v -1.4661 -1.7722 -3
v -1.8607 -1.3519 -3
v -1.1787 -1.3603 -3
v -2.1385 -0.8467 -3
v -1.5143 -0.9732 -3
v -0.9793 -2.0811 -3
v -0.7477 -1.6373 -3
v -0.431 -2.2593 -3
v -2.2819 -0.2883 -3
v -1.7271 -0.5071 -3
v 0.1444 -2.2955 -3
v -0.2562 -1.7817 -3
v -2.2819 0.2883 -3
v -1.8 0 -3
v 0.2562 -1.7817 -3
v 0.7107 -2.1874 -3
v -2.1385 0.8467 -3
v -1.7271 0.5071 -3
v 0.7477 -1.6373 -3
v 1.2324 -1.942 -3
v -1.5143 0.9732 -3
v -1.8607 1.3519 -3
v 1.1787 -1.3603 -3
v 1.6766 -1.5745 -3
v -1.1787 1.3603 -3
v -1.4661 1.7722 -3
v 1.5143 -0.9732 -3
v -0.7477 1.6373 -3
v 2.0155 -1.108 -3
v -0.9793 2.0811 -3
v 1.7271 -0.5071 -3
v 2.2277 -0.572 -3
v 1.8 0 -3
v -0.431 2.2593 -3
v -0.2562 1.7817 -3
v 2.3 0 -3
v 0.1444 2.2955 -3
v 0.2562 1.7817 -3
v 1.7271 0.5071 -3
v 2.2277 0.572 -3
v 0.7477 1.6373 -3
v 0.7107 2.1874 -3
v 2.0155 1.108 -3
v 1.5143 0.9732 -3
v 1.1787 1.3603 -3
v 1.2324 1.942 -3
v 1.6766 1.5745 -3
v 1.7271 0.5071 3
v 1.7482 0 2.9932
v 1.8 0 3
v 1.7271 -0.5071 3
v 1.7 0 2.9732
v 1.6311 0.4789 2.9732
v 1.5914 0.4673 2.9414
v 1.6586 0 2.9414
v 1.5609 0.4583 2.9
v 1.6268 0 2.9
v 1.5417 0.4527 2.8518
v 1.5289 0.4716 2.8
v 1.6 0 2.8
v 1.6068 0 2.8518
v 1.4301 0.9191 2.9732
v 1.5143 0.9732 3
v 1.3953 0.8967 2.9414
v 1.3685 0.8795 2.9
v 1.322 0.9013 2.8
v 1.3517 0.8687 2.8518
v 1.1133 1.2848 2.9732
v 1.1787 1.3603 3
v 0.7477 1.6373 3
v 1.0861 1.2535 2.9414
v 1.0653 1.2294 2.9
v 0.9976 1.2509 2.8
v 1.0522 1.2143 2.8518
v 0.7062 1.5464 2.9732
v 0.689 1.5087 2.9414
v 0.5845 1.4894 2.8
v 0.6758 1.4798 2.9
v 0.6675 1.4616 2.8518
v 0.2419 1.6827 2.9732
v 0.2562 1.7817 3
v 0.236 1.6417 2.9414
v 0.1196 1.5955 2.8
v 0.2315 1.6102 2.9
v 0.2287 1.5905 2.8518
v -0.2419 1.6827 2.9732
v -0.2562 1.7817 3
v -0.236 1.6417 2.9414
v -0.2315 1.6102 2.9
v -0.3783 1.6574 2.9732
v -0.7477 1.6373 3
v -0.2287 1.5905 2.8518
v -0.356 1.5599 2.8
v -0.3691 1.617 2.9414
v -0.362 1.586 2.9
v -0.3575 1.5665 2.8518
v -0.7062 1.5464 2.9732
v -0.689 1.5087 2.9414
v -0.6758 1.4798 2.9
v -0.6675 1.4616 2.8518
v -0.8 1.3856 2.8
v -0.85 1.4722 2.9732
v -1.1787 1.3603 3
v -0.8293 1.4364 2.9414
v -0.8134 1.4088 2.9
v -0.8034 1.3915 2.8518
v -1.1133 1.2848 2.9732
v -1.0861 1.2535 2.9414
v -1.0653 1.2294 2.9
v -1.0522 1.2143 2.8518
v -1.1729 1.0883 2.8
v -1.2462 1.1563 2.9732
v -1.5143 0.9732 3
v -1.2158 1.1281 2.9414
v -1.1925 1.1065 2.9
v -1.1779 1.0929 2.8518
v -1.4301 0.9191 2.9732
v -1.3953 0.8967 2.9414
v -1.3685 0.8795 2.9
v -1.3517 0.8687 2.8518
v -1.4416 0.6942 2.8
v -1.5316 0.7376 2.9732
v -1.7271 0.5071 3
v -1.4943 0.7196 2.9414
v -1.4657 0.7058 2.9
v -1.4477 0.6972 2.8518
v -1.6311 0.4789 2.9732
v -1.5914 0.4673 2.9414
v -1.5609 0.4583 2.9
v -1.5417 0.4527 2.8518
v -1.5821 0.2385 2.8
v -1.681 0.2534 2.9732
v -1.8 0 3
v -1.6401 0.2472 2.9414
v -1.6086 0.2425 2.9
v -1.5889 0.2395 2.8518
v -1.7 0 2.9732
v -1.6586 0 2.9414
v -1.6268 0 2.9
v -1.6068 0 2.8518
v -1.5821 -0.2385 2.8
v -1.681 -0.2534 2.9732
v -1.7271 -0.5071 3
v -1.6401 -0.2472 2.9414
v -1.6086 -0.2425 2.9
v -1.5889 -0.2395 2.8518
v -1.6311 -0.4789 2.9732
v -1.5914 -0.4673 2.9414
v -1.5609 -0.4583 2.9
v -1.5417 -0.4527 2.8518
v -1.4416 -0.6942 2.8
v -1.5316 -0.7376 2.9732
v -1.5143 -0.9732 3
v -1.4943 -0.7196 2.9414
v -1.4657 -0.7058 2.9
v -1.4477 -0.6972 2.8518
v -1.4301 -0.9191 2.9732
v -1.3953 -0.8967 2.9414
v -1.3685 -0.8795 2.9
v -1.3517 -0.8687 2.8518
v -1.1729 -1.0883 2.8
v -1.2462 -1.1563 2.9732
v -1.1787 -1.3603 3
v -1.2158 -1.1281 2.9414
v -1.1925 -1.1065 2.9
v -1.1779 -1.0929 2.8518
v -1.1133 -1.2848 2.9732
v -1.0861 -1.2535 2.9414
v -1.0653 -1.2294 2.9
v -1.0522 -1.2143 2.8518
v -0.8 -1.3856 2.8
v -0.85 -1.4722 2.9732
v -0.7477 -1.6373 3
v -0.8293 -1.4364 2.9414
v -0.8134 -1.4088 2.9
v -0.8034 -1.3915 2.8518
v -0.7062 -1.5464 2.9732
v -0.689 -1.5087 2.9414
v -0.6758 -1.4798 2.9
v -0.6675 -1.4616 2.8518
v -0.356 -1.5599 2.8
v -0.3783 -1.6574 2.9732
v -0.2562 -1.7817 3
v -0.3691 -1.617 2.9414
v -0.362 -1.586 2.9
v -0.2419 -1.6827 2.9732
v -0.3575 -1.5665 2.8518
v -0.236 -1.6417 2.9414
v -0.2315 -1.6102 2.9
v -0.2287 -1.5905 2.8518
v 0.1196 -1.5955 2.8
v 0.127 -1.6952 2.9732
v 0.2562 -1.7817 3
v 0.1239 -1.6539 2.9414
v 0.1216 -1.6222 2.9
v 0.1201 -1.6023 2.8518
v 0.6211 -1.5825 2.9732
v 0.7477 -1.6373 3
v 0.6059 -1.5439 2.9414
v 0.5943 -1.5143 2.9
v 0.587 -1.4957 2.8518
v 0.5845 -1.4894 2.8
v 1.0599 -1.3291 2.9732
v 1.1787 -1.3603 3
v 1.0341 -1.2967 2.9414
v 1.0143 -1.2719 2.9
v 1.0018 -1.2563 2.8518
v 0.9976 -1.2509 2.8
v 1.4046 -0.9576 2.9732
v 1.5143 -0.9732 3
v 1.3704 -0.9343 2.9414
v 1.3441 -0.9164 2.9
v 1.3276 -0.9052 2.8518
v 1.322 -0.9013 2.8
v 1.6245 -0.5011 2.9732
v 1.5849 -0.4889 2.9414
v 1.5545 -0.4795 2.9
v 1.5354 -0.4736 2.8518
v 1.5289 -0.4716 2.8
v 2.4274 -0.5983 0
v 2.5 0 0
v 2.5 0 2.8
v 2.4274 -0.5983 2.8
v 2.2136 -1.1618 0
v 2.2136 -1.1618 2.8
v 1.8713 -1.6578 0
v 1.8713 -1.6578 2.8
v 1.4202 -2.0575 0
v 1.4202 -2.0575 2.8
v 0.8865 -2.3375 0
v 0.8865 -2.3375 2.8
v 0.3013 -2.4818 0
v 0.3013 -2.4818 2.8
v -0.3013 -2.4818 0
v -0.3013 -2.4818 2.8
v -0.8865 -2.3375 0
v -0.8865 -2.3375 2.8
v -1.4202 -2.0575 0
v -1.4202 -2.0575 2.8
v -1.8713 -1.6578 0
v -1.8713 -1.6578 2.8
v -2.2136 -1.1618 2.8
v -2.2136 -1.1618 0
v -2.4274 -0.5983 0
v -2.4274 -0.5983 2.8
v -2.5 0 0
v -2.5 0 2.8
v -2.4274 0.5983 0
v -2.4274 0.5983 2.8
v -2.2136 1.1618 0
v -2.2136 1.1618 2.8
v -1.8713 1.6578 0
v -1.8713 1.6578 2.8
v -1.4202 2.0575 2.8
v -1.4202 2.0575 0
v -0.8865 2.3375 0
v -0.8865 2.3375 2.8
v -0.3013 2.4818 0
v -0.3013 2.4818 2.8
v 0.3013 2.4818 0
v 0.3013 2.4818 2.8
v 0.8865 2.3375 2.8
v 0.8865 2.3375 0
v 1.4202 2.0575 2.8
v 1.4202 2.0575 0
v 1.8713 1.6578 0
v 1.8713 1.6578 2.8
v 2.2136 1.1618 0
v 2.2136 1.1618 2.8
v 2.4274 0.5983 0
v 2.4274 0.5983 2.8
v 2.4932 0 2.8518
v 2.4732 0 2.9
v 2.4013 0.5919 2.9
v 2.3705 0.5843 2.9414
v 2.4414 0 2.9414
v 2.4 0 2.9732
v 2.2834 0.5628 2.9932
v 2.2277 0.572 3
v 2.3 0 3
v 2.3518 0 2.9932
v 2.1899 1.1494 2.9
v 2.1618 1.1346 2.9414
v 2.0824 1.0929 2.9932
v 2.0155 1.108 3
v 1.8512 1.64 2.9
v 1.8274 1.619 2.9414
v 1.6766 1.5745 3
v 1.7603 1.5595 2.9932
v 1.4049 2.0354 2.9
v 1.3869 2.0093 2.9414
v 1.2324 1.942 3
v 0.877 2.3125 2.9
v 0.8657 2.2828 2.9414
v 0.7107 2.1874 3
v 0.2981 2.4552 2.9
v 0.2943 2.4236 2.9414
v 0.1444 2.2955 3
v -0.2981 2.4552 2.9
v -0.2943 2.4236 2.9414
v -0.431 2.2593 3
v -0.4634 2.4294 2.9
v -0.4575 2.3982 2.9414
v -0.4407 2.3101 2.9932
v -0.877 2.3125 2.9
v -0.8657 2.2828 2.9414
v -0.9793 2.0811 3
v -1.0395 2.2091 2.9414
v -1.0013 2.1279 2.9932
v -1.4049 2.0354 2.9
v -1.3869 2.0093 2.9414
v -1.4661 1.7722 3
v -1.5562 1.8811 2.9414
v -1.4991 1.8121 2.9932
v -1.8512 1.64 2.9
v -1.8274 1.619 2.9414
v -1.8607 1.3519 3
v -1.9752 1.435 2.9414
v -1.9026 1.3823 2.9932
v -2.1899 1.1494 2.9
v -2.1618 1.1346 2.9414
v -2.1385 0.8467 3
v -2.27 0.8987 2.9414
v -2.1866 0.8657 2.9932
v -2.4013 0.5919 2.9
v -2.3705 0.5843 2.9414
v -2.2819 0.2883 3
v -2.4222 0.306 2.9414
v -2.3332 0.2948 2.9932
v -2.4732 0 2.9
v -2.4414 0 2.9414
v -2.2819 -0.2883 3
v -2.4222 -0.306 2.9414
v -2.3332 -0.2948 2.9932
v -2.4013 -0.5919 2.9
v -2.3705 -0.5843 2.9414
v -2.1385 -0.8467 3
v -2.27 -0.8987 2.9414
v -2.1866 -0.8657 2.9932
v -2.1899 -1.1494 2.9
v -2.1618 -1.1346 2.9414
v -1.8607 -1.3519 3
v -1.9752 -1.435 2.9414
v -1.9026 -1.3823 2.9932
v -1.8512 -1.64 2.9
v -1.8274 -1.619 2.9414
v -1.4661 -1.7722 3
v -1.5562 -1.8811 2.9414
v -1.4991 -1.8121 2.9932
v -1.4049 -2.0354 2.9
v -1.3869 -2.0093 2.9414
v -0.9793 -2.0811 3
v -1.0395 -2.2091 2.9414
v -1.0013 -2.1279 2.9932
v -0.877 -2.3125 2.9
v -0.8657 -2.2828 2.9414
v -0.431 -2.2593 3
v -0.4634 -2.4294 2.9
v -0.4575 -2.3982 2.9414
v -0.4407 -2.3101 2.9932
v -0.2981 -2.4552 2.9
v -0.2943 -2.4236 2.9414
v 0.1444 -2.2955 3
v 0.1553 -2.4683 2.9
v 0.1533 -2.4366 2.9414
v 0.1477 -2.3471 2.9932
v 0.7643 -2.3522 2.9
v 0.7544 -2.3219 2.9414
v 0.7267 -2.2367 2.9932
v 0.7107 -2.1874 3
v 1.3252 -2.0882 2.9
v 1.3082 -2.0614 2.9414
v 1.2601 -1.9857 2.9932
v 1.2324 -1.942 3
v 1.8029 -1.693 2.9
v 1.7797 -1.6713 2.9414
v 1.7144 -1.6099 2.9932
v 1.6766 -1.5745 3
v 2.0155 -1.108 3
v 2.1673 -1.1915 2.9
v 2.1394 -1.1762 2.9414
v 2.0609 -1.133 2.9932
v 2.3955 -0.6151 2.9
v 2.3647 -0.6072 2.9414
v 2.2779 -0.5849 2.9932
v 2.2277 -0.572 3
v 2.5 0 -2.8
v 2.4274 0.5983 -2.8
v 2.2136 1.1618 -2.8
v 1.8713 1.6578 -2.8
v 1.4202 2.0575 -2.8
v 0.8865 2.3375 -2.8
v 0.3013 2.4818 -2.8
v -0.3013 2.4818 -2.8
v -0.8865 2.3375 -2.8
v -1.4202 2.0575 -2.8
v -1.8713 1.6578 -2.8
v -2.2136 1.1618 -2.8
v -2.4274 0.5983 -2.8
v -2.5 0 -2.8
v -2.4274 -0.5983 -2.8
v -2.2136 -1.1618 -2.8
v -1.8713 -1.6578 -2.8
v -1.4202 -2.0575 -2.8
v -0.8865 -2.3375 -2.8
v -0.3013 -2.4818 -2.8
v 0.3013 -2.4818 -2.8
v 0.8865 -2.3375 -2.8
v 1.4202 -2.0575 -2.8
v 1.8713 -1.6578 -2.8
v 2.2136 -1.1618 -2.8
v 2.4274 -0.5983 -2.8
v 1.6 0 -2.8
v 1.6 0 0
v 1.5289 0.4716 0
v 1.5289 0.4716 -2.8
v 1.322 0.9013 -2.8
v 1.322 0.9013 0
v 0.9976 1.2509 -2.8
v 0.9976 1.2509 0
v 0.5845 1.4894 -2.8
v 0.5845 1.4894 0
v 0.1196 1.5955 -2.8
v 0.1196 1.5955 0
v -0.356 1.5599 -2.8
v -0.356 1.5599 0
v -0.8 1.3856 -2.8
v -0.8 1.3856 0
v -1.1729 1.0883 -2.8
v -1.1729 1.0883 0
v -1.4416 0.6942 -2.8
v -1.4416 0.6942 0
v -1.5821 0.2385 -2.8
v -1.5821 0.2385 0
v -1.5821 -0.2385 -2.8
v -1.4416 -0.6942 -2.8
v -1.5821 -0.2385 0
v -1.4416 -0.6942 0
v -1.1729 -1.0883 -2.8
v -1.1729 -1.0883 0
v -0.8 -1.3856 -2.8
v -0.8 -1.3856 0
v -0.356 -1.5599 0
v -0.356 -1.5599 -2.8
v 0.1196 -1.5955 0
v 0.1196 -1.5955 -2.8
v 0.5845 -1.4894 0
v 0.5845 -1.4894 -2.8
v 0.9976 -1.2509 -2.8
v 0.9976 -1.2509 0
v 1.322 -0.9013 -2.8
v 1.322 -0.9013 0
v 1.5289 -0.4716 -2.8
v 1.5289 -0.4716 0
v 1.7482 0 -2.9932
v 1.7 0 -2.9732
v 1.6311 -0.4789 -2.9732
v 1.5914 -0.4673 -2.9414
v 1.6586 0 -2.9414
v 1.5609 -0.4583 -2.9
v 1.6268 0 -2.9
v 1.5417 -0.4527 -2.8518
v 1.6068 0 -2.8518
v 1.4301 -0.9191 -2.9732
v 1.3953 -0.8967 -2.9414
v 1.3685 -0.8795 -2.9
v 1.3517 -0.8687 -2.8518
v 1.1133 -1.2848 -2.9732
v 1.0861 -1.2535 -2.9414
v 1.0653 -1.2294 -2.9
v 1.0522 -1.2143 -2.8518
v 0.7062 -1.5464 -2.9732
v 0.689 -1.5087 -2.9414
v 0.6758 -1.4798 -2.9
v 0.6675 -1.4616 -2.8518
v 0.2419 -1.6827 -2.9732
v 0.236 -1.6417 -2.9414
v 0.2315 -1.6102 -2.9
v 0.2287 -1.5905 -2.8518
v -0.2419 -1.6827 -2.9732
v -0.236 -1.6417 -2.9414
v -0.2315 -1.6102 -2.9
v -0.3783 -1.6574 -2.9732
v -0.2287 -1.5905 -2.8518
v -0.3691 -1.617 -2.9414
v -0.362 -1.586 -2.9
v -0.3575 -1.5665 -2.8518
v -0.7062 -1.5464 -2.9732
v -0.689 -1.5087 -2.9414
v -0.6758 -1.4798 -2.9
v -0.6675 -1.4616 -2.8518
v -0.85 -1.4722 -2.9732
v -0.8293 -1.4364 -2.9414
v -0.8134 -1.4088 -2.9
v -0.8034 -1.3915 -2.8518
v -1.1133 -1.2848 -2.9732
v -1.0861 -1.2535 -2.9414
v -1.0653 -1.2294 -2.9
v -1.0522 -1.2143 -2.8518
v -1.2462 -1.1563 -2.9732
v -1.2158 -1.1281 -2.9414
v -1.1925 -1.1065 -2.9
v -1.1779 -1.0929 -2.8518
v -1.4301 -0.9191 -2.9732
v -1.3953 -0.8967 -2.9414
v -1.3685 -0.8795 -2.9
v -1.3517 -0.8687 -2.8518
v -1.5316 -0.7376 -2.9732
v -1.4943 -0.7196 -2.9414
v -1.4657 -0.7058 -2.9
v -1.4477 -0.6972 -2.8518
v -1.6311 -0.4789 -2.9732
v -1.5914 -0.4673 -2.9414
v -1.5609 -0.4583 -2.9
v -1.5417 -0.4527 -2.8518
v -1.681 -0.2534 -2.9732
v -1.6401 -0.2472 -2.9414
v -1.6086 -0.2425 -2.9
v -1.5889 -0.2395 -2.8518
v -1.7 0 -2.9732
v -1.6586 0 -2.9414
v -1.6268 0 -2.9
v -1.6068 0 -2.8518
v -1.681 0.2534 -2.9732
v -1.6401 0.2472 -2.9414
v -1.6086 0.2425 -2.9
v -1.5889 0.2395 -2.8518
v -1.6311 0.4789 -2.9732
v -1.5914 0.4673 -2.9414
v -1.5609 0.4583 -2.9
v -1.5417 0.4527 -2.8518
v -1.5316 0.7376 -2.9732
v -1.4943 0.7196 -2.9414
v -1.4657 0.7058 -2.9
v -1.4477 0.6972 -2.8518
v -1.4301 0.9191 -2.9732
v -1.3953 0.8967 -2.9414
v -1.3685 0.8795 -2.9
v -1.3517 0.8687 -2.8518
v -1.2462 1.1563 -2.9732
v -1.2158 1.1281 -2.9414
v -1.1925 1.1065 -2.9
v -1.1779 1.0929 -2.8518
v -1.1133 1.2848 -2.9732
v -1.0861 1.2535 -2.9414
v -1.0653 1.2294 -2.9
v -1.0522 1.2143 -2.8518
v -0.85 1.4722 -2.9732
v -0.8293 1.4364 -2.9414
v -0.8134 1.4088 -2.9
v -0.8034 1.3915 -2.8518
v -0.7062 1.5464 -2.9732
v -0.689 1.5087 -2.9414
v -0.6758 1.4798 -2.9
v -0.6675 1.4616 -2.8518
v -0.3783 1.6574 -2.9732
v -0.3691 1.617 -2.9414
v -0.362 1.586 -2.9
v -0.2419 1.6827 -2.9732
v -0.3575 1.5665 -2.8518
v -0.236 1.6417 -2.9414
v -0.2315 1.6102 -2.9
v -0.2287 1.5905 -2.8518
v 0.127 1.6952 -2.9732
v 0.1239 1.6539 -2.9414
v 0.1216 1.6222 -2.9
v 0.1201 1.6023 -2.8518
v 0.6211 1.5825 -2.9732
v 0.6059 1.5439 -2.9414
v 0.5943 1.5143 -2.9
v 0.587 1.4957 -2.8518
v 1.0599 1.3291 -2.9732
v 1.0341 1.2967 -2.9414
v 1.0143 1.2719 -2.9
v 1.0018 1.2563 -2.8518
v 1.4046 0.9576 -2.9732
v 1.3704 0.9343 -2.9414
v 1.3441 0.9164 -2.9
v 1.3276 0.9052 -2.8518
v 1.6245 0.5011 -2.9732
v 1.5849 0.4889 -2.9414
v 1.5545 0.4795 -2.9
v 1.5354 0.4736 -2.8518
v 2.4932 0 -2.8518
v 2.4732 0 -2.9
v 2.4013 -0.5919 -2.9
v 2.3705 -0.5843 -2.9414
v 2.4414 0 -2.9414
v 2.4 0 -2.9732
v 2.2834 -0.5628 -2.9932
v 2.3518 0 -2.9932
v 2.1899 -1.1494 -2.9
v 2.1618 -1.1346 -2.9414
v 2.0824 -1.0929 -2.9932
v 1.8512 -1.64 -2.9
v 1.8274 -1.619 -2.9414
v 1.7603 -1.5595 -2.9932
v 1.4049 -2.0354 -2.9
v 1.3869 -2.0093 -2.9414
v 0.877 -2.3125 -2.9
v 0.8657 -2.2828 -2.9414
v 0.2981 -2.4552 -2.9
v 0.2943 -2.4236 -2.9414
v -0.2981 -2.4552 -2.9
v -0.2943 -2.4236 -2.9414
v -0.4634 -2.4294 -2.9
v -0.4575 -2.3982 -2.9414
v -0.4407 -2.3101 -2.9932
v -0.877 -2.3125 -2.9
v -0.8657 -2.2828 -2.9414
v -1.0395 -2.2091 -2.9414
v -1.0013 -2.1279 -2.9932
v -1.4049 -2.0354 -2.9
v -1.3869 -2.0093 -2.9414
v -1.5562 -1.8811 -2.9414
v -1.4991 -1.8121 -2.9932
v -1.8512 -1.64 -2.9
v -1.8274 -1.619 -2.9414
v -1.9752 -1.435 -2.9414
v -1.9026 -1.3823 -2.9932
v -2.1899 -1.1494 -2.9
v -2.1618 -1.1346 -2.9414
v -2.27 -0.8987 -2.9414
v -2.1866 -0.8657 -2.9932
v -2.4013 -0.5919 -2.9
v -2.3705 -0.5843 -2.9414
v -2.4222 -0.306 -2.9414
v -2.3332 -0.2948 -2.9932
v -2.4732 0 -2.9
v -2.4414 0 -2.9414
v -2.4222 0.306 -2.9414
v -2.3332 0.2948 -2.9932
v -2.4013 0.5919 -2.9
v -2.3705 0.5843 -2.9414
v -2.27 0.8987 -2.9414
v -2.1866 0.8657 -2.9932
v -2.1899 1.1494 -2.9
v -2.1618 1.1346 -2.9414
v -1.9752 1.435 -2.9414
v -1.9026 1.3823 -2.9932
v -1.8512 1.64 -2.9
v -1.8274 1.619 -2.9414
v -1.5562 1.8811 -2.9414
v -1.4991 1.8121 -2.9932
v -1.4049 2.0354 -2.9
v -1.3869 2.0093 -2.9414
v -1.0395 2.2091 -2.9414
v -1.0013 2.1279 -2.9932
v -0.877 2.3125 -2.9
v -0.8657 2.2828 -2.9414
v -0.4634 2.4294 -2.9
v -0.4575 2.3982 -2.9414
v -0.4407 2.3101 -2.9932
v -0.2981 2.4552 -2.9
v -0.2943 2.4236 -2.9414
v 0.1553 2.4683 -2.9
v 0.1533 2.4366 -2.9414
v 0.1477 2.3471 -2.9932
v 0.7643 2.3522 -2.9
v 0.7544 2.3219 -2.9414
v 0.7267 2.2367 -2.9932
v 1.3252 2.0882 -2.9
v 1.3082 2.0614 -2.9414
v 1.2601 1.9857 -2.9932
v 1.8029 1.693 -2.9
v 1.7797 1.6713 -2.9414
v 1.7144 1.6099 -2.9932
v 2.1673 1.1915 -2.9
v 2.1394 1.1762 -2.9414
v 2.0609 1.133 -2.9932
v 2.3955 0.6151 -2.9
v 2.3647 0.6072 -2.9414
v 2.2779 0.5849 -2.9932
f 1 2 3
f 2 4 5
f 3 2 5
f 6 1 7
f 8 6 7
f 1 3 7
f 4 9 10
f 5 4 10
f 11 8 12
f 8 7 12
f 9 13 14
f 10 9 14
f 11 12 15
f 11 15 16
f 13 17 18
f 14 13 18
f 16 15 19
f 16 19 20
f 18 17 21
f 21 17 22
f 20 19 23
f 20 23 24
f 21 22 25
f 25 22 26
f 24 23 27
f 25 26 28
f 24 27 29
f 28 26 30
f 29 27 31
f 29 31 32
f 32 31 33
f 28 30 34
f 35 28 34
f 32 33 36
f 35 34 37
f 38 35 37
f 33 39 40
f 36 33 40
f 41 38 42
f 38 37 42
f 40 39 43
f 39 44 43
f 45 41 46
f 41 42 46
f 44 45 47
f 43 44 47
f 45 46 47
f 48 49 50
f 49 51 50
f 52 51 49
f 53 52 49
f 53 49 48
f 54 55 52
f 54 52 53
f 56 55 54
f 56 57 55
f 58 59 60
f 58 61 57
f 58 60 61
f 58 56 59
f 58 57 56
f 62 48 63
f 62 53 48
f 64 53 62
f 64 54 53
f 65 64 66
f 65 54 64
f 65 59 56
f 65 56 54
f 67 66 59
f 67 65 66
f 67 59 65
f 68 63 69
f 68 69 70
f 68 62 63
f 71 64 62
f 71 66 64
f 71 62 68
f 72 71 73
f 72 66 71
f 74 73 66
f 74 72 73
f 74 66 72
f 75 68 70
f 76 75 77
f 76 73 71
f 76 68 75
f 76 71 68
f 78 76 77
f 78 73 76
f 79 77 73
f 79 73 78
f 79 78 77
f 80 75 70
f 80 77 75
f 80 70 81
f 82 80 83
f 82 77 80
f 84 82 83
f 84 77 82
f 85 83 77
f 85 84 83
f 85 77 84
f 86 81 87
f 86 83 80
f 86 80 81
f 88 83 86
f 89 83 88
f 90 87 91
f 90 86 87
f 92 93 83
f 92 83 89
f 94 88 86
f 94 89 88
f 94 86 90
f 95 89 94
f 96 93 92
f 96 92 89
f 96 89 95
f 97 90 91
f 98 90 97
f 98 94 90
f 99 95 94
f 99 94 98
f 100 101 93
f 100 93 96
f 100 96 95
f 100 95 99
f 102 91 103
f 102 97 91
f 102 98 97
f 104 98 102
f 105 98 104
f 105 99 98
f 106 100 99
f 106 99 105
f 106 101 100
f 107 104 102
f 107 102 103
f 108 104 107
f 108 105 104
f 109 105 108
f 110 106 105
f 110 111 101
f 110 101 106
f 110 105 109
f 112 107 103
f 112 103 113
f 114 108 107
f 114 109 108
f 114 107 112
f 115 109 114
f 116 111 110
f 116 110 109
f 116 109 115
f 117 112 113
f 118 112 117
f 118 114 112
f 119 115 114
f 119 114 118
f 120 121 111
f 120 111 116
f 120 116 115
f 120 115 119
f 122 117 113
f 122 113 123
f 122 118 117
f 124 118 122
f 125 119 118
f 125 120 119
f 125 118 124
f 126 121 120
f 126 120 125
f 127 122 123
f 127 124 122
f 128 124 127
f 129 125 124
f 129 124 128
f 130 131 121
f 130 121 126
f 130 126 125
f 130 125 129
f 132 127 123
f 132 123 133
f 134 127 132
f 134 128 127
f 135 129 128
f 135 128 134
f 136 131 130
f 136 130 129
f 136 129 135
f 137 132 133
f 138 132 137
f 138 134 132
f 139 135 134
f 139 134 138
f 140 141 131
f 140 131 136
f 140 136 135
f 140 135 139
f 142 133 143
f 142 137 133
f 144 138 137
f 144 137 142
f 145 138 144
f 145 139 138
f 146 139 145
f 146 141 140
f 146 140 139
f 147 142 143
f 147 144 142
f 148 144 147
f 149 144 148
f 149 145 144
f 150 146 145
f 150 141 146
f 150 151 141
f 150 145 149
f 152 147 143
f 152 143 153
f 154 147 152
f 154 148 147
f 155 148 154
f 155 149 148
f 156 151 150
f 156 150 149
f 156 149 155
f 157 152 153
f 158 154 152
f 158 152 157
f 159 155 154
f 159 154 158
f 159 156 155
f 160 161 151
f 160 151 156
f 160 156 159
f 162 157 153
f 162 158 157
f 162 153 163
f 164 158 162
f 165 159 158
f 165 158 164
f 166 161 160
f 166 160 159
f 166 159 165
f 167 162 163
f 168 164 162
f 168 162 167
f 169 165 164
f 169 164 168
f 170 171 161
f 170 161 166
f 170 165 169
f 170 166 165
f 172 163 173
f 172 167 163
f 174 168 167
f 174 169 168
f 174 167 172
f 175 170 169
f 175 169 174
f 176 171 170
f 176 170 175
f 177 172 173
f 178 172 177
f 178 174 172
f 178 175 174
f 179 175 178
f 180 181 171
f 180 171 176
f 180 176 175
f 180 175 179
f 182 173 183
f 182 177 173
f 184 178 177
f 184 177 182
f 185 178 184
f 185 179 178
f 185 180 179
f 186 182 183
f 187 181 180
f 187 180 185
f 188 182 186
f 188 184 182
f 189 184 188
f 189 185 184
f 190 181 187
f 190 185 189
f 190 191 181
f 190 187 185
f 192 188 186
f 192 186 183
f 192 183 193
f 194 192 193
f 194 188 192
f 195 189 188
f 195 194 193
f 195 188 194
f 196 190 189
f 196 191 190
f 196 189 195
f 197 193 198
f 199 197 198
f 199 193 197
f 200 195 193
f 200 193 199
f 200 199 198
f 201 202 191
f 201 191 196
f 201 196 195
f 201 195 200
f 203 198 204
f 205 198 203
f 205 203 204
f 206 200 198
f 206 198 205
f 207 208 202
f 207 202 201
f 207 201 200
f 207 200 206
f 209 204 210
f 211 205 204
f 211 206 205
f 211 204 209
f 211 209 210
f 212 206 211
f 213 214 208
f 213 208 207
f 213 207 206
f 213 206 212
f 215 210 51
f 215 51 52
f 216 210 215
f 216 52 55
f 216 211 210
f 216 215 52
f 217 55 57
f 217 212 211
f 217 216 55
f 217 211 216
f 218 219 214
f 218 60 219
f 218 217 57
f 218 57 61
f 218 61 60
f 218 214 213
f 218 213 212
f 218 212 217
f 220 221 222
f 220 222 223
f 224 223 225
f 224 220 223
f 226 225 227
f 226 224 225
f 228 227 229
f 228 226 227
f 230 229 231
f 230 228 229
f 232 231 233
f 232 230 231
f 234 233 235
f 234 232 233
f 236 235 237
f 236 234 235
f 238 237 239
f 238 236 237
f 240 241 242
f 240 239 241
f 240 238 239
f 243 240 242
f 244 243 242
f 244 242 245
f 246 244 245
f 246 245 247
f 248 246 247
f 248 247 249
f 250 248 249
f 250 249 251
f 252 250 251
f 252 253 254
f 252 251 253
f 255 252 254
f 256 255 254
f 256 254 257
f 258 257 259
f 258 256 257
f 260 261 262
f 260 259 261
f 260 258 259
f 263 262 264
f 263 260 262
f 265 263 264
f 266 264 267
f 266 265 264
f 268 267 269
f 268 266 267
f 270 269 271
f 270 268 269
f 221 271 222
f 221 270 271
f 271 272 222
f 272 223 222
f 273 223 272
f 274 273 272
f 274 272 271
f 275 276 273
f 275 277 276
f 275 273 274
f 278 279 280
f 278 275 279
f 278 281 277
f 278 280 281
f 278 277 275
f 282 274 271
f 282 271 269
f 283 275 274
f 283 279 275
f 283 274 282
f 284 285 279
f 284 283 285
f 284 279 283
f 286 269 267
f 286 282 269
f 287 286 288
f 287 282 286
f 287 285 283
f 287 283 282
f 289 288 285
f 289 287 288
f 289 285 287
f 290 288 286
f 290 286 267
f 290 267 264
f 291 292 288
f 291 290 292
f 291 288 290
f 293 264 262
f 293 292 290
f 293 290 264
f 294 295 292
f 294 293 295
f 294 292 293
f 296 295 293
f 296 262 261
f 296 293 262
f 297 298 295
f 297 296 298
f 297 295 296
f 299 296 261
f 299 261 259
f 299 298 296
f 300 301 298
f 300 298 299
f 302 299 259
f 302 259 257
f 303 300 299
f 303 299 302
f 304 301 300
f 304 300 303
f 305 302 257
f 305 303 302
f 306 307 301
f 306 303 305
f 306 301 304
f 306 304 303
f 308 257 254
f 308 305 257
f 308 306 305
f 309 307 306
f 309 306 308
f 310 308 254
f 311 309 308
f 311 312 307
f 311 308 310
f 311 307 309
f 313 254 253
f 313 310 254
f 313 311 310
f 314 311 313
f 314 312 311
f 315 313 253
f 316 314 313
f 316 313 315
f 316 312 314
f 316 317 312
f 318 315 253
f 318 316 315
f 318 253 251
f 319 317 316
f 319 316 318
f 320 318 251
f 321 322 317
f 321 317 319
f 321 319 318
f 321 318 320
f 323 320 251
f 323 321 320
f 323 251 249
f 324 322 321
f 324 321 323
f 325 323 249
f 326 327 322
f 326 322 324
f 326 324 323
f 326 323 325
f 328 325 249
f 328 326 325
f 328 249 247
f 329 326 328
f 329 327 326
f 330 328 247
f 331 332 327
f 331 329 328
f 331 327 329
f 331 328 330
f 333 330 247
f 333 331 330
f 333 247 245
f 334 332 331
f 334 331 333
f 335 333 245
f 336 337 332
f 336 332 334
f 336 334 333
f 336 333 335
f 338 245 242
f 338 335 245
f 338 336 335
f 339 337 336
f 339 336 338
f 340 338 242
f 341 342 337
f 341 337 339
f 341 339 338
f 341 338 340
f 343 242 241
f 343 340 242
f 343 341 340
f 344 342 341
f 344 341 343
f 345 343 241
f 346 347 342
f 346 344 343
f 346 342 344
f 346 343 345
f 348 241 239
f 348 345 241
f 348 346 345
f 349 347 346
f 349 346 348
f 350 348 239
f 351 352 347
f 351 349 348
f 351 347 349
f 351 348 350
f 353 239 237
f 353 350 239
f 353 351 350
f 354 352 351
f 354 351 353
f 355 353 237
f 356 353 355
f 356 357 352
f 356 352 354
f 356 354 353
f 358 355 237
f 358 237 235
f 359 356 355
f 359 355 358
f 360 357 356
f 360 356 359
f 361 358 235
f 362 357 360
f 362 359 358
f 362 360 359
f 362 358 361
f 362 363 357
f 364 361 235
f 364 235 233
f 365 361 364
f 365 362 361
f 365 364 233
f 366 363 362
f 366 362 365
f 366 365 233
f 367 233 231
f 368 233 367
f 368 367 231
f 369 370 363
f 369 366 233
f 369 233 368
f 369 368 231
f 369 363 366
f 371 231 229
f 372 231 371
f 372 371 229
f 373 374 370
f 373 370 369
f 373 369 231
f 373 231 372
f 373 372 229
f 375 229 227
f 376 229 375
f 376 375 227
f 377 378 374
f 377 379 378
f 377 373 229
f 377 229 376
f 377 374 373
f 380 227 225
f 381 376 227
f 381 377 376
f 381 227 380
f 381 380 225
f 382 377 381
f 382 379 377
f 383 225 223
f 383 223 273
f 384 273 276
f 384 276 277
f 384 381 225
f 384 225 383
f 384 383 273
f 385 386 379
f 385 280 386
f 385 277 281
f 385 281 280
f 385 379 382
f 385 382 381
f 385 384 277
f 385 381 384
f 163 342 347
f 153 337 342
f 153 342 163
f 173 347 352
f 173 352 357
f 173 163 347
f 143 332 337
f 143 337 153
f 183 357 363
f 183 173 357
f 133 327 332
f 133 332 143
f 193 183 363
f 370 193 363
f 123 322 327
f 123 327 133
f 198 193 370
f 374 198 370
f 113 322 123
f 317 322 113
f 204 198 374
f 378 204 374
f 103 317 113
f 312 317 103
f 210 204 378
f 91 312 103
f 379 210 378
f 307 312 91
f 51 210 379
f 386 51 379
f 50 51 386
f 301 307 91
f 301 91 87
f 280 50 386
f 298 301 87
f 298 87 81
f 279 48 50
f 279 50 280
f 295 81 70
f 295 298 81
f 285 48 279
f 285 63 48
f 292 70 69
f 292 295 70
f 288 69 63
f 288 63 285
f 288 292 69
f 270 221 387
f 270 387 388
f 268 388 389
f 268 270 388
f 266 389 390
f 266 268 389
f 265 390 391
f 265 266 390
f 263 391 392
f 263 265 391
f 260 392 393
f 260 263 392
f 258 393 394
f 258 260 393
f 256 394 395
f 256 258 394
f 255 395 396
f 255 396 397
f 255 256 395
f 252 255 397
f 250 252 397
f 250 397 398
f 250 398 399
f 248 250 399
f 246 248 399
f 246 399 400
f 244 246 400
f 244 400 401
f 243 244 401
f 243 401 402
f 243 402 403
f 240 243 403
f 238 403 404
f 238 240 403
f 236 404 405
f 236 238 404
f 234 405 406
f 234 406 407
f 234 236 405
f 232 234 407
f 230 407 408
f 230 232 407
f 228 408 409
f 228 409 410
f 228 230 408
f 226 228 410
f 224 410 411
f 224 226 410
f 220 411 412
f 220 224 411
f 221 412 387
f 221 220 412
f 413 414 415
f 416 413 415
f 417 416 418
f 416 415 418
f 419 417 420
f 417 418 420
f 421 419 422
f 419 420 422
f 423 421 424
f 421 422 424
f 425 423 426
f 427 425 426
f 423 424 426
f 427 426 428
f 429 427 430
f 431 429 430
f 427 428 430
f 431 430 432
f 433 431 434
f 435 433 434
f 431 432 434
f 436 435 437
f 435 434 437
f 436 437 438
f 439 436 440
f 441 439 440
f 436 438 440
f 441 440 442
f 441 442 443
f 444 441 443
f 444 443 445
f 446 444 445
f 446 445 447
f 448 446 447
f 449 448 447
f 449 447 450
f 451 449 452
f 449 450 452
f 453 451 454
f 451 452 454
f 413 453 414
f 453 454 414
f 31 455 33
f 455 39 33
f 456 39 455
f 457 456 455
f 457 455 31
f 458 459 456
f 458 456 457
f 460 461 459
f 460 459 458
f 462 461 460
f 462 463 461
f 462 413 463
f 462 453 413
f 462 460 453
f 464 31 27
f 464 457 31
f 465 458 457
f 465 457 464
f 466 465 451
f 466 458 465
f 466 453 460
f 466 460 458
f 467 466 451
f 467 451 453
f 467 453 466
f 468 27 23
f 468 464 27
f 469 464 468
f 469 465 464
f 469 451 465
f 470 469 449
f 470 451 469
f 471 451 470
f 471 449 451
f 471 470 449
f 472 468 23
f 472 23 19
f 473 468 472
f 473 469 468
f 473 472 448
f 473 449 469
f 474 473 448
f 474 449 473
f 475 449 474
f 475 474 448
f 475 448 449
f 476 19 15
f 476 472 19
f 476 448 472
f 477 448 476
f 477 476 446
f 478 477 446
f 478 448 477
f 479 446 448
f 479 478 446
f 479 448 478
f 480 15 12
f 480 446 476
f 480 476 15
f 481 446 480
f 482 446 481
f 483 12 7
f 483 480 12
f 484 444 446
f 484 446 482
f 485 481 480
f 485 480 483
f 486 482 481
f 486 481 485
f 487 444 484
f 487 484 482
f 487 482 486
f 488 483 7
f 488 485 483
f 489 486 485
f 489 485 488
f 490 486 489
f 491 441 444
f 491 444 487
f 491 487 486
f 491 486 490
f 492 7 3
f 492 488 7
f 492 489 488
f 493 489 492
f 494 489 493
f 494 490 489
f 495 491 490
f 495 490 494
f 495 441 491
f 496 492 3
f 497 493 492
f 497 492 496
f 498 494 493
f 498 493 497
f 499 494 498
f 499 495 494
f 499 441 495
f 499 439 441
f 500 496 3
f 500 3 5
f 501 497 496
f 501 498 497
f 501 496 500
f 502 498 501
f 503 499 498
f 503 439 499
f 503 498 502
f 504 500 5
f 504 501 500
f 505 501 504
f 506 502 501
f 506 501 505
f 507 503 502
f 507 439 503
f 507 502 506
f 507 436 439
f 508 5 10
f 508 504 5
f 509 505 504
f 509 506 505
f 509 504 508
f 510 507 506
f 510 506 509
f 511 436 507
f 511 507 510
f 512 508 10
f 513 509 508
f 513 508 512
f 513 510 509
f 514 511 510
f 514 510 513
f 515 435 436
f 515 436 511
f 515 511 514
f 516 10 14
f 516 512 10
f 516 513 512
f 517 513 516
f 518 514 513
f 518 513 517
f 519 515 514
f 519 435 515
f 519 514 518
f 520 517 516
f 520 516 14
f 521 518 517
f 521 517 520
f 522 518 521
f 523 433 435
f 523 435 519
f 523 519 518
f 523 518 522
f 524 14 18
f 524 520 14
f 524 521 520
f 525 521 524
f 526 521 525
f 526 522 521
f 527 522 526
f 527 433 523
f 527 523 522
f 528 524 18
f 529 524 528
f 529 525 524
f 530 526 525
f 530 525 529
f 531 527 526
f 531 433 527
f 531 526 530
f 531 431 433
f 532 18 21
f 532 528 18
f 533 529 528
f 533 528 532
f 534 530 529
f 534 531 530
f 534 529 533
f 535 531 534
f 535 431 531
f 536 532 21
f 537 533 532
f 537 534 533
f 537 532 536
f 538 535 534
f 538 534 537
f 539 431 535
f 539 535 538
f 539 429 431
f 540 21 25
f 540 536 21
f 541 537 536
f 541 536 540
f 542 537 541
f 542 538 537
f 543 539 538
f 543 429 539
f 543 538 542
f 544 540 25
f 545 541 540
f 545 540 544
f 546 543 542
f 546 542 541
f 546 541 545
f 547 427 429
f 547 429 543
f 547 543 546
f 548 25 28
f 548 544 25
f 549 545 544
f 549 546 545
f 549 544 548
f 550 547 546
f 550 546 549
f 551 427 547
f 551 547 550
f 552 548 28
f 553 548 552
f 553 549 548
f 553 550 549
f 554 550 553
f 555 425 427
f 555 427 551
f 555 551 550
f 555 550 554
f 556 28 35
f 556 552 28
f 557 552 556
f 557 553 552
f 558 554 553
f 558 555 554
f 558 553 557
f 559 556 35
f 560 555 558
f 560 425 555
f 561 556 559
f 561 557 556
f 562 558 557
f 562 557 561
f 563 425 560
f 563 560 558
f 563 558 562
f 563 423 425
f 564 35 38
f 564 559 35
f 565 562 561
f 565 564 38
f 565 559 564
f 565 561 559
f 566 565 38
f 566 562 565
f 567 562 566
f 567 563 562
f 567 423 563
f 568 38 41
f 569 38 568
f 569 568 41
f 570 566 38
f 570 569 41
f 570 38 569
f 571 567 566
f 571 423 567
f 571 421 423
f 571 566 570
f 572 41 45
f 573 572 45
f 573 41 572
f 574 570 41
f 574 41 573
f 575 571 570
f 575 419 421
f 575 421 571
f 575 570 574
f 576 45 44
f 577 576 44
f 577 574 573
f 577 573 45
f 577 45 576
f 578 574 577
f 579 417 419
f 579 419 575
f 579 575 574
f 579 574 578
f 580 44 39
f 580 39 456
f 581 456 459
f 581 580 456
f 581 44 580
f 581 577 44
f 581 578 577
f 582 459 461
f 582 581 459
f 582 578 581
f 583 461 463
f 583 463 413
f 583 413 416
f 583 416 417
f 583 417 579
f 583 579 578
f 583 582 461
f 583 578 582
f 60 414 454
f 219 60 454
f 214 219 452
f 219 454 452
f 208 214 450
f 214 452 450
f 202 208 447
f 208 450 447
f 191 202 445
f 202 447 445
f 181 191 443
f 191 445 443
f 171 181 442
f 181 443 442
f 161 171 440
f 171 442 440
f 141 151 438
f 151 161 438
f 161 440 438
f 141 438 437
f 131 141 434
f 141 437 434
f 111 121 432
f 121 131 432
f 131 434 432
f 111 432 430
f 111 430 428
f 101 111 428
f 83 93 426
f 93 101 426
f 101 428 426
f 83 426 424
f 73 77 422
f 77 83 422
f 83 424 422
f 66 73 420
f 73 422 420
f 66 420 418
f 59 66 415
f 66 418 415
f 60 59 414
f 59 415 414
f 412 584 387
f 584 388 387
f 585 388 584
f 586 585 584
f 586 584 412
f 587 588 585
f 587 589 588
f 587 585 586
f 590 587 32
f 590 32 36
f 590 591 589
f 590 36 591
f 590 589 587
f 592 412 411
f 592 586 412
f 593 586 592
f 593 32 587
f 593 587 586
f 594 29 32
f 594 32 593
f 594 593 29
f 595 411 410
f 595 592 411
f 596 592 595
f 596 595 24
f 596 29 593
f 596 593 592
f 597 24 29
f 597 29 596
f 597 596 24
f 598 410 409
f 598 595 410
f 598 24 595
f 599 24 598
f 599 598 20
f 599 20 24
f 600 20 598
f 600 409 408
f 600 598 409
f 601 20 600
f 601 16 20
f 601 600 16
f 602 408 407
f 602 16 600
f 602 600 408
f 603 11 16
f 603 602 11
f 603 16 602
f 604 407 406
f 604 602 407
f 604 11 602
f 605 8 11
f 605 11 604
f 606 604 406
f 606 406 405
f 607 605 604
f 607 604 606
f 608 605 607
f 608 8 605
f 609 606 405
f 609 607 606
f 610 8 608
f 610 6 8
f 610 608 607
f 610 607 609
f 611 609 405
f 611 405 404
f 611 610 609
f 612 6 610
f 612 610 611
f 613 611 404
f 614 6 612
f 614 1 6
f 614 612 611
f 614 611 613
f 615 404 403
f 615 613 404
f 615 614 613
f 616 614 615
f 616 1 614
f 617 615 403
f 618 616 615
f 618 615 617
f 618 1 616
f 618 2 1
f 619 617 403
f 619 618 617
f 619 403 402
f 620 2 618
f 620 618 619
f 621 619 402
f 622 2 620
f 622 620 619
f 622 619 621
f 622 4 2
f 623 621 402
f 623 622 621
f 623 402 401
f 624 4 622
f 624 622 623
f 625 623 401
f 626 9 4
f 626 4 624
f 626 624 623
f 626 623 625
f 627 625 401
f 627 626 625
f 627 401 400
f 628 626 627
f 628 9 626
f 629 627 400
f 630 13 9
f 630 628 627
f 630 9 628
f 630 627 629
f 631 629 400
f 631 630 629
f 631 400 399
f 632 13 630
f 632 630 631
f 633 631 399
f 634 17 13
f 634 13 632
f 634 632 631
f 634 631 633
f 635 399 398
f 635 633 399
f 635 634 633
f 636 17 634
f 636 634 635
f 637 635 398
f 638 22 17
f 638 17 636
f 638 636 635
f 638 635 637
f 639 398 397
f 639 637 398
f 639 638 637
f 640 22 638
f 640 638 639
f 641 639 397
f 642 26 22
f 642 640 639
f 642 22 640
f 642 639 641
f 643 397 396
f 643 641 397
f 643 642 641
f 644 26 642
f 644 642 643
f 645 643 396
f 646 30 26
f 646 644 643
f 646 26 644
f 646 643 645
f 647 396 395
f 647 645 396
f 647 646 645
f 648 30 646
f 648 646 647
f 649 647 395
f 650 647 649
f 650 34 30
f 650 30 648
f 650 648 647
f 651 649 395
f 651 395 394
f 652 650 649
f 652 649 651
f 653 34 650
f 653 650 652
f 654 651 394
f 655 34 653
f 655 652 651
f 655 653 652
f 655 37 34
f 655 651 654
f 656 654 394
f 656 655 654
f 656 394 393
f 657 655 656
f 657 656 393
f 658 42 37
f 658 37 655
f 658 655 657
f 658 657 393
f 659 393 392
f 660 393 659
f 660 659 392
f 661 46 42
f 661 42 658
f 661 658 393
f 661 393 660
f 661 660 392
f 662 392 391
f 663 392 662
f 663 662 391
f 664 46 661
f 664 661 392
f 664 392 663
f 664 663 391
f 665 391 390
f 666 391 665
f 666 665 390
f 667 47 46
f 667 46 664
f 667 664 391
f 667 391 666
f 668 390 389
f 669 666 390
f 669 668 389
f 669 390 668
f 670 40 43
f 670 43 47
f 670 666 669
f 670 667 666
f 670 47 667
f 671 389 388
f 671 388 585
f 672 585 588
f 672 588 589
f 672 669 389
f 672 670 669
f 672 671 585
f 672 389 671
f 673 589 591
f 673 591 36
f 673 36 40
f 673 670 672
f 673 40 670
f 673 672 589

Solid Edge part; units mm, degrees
sketch "Sketch1" plane through (0, 0, 0) normal (0, 0, 1) x (1, 0, 0)
  circle A0 centre (0, 0) radius 2.5
  circle A1 centre (0, 0) radius 1.6
  dimension "D1" = 3.2
  dimension "D2" = 5
extrude "ExtrudedProtrusion_1" add sketch "Sketch1" along normal mid plane 6
fillet "Round_1" radius 0.2 4 edges at (-1.6, 0, 3) (-2.5, 0, 3) (-1.6, 0, -3) (-2.5, 0, -3)
properties material "Acrylic, high impact grade"
